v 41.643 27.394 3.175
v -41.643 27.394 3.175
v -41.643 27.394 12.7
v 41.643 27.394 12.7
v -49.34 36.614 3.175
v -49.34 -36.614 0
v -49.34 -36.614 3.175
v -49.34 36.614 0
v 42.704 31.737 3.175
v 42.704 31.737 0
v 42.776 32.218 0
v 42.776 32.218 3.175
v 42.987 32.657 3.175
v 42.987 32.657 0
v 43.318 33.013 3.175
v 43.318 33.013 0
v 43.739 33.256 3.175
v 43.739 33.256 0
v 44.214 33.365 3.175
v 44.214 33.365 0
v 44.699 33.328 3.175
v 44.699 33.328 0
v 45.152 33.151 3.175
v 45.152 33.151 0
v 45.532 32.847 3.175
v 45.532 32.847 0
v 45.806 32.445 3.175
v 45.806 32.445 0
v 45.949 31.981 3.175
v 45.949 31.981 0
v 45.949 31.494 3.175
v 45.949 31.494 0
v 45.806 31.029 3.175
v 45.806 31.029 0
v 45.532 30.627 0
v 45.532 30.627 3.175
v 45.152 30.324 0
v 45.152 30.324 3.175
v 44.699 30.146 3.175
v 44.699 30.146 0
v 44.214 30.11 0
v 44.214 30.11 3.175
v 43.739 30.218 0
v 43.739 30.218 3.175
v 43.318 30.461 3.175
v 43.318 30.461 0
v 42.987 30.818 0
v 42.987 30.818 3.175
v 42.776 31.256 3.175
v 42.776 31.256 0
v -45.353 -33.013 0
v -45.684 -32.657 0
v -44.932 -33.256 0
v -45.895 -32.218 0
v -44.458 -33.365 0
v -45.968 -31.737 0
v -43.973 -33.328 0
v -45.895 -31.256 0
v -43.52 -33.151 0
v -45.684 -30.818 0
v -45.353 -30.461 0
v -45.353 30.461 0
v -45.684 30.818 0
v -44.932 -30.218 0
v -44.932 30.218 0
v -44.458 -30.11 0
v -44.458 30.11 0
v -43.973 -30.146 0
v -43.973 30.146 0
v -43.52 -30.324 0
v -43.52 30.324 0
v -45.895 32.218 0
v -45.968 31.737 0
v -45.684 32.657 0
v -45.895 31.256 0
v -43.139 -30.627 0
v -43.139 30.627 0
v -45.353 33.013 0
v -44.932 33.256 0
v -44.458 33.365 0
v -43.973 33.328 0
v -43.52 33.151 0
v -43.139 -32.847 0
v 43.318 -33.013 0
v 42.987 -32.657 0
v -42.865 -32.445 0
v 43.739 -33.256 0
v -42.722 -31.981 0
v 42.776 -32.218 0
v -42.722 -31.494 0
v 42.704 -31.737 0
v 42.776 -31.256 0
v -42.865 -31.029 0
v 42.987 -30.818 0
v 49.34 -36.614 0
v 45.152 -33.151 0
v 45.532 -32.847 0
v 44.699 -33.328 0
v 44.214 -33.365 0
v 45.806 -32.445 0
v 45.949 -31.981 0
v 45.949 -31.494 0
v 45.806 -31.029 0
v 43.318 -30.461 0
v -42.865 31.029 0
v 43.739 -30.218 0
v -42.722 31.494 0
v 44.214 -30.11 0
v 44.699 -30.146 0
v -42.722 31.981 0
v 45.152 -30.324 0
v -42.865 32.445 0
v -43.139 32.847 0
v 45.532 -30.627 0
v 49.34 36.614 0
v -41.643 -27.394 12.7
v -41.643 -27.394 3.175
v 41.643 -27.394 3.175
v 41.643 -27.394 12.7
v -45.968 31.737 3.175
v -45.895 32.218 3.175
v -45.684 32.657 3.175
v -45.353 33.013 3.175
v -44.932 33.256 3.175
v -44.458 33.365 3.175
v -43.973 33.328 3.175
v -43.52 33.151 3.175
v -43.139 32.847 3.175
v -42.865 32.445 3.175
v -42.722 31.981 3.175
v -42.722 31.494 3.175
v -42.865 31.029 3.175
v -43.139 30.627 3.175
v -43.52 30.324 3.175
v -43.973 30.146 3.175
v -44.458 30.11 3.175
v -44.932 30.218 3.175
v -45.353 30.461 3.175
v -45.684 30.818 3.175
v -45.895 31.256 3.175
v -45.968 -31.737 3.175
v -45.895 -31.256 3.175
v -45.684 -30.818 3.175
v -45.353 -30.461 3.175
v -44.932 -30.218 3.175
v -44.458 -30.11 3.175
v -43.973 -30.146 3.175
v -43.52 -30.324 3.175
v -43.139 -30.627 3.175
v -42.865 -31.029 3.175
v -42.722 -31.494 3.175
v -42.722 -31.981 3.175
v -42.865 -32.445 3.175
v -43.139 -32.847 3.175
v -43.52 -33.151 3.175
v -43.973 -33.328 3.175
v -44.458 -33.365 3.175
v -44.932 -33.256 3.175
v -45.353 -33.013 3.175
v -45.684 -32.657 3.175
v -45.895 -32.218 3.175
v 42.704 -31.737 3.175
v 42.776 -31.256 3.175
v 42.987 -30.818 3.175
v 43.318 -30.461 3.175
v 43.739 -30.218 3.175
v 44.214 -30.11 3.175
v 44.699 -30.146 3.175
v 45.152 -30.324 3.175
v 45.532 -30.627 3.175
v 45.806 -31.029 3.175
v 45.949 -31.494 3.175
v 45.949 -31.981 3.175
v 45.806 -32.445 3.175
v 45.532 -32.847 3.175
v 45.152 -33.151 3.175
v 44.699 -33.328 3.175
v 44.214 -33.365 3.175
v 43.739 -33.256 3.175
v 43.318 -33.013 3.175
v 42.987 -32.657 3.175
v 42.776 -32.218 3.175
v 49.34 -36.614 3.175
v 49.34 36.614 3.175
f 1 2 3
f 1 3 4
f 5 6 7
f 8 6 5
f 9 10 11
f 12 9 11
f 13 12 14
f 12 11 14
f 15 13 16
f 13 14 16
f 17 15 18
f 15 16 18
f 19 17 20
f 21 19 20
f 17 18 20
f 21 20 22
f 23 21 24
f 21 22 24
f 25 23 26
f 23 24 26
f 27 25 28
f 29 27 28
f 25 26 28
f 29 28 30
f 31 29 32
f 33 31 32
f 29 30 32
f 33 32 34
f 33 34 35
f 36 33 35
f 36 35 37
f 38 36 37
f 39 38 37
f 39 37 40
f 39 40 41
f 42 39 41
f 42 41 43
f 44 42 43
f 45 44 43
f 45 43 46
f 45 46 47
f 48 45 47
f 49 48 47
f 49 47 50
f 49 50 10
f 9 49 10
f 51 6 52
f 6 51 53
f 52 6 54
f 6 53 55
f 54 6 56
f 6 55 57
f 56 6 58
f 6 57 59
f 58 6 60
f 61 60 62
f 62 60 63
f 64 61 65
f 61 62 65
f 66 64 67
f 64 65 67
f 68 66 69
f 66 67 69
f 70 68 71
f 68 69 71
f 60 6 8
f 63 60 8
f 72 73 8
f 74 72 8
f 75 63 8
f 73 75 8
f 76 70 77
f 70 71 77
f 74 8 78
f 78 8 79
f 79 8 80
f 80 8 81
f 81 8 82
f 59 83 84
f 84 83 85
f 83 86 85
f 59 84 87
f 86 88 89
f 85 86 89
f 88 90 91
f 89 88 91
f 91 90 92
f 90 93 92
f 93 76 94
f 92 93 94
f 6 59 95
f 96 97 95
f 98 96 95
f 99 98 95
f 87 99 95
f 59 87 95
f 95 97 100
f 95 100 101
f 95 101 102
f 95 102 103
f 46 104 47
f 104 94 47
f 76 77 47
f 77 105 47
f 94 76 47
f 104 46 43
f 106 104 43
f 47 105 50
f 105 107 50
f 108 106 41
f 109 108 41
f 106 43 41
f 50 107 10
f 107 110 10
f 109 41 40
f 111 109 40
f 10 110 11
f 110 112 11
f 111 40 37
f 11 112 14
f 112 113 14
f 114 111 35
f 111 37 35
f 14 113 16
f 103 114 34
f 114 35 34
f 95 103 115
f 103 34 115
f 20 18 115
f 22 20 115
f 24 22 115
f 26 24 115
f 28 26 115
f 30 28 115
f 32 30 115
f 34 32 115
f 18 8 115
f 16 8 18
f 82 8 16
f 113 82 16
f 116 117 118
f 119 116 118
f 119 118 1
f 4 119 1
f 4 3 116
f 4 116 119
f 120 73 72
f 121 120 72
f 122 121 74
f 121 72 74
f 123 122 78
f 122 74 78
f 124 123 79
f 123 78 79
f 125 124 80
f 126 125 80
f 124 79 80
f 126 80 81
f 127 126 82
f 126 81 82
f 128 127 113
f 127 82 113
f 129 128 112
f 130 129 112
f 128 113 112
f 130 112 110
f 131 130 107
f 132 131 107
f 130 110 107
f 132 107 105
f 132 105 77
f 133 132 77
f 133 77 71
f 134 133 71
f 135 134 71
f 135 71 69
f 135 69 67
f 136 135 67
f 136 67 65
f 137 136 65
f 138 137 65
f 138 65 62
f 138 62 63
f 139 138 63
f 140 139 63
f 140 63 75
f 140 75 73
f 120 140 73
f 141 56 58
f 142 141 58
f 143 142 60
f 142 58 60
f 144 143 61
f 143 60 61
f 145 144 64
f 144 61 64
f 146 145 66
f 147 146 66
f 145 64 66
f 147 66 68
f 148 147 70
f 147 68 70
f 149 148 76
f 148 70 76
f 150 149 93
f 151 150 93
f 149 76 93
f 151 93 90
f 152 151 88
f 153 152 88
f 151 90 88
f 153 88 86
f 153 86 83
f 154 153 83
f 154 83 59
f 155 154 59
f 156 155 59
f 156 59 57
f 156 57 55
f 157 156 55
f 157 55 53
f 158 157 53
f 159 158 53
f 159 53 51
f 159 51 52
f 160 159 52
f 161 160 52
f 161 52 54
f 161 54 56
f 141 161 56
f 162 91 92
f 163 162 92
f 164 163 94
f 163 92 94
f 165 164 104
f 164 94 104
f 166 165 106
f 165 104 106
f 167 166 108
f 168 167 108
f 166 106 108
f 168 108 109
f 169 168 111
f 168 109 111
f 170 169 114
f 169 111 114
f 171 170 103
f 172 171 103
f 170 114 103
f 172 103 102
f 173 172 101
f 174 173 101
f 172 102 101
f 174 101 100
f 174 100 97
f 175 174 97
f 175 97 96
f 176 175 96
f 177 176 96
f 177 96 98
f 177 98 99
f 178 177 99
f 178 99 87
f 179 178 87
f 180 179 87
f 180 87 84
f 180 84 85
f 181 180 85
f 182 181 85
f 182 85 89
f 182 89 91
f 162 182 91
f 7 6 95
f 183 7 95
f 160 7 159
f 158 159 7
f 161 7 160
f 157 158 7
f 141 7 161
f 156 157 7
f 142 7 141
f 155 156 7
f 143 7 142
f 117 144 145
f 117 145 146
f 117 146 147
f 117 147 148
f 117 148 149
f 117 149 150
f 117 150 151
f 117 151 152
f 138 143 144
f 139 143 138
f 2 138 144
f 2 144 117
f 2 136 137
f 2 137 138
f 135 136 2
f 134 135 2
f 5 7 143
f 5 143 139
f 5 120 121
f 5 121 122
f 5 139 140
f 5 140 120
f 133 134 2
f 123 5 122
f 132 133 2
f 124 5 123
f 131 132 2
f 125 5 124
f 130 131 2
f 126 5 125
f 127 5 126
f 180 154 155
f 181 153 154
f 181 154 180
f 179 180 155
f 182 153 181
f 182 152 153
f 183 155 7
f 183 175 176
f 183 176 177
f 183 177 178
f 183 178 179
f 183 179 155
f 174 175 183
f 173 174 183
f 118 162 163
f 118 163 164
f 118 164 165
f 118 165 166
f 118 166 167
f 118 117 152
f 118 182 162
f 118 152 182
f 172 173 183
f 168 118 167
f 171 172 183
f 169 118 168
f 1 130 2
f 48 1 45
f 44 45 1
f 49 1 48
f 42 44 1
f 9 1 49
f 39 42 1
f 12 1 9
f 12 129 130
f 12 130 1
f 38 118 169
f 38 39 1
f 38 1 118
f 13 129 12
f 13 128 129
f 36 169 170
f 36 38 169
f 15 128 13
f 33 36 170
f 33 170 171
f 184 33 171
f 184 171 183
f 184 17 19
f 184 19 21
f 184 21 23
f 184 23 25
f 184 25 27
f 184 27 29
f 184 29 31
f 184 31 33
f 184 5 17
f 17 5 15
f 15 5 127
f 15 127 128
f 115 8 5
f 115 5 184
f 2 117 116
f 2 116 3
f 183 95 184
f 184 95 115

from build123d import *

# Parameters (mm, degrees)
SKETCH1_W             = 98.679
SKETCH1_H             = 73.2282
BOSS_EXTRUDE1_DEPTH   = 3.175
SKETCH2_W             = 83.2866
SKETCH2_H             = 54.7878
BOSS_EXTRUDE2_DEPTH   = 9.525
F_4_CLEARANCE_HOLE1_D = 3.2639


with BuildPart() as part:
    # Sketch1 → Boss-Extrude1 (new body)
    with BuildSketch(Plane.XY):
        Rectangle(SKETCH1_W, SKETCH1_H)
    extrude(amount=BOSS_EXTRUDE1_DEPTH)

    # Sketch2 → Boss-Extrude2 (add)
    with BuildSketch(Plane.XY.offset(3.175)):
        Rectangle(SKETCH2_W, SKETCH2_H)
    extrude(amount=BOSS_EXTRUDE2_DEPTH)

    # #4 Clearance Hole1 (through all)
    with Locations(Plane(origin=(-44.3357, 31.7373, 12.7), x_dir=(1, 0, 0), z_dir=(0, 0, 1))):
        with Locations((0, 0), (88.6714, 0), (88.6714, -63.4746), (0, -63.4746)):
            Hole(F_4_CLEARANCE_HOLE1_D / 2)


solid = part.part
